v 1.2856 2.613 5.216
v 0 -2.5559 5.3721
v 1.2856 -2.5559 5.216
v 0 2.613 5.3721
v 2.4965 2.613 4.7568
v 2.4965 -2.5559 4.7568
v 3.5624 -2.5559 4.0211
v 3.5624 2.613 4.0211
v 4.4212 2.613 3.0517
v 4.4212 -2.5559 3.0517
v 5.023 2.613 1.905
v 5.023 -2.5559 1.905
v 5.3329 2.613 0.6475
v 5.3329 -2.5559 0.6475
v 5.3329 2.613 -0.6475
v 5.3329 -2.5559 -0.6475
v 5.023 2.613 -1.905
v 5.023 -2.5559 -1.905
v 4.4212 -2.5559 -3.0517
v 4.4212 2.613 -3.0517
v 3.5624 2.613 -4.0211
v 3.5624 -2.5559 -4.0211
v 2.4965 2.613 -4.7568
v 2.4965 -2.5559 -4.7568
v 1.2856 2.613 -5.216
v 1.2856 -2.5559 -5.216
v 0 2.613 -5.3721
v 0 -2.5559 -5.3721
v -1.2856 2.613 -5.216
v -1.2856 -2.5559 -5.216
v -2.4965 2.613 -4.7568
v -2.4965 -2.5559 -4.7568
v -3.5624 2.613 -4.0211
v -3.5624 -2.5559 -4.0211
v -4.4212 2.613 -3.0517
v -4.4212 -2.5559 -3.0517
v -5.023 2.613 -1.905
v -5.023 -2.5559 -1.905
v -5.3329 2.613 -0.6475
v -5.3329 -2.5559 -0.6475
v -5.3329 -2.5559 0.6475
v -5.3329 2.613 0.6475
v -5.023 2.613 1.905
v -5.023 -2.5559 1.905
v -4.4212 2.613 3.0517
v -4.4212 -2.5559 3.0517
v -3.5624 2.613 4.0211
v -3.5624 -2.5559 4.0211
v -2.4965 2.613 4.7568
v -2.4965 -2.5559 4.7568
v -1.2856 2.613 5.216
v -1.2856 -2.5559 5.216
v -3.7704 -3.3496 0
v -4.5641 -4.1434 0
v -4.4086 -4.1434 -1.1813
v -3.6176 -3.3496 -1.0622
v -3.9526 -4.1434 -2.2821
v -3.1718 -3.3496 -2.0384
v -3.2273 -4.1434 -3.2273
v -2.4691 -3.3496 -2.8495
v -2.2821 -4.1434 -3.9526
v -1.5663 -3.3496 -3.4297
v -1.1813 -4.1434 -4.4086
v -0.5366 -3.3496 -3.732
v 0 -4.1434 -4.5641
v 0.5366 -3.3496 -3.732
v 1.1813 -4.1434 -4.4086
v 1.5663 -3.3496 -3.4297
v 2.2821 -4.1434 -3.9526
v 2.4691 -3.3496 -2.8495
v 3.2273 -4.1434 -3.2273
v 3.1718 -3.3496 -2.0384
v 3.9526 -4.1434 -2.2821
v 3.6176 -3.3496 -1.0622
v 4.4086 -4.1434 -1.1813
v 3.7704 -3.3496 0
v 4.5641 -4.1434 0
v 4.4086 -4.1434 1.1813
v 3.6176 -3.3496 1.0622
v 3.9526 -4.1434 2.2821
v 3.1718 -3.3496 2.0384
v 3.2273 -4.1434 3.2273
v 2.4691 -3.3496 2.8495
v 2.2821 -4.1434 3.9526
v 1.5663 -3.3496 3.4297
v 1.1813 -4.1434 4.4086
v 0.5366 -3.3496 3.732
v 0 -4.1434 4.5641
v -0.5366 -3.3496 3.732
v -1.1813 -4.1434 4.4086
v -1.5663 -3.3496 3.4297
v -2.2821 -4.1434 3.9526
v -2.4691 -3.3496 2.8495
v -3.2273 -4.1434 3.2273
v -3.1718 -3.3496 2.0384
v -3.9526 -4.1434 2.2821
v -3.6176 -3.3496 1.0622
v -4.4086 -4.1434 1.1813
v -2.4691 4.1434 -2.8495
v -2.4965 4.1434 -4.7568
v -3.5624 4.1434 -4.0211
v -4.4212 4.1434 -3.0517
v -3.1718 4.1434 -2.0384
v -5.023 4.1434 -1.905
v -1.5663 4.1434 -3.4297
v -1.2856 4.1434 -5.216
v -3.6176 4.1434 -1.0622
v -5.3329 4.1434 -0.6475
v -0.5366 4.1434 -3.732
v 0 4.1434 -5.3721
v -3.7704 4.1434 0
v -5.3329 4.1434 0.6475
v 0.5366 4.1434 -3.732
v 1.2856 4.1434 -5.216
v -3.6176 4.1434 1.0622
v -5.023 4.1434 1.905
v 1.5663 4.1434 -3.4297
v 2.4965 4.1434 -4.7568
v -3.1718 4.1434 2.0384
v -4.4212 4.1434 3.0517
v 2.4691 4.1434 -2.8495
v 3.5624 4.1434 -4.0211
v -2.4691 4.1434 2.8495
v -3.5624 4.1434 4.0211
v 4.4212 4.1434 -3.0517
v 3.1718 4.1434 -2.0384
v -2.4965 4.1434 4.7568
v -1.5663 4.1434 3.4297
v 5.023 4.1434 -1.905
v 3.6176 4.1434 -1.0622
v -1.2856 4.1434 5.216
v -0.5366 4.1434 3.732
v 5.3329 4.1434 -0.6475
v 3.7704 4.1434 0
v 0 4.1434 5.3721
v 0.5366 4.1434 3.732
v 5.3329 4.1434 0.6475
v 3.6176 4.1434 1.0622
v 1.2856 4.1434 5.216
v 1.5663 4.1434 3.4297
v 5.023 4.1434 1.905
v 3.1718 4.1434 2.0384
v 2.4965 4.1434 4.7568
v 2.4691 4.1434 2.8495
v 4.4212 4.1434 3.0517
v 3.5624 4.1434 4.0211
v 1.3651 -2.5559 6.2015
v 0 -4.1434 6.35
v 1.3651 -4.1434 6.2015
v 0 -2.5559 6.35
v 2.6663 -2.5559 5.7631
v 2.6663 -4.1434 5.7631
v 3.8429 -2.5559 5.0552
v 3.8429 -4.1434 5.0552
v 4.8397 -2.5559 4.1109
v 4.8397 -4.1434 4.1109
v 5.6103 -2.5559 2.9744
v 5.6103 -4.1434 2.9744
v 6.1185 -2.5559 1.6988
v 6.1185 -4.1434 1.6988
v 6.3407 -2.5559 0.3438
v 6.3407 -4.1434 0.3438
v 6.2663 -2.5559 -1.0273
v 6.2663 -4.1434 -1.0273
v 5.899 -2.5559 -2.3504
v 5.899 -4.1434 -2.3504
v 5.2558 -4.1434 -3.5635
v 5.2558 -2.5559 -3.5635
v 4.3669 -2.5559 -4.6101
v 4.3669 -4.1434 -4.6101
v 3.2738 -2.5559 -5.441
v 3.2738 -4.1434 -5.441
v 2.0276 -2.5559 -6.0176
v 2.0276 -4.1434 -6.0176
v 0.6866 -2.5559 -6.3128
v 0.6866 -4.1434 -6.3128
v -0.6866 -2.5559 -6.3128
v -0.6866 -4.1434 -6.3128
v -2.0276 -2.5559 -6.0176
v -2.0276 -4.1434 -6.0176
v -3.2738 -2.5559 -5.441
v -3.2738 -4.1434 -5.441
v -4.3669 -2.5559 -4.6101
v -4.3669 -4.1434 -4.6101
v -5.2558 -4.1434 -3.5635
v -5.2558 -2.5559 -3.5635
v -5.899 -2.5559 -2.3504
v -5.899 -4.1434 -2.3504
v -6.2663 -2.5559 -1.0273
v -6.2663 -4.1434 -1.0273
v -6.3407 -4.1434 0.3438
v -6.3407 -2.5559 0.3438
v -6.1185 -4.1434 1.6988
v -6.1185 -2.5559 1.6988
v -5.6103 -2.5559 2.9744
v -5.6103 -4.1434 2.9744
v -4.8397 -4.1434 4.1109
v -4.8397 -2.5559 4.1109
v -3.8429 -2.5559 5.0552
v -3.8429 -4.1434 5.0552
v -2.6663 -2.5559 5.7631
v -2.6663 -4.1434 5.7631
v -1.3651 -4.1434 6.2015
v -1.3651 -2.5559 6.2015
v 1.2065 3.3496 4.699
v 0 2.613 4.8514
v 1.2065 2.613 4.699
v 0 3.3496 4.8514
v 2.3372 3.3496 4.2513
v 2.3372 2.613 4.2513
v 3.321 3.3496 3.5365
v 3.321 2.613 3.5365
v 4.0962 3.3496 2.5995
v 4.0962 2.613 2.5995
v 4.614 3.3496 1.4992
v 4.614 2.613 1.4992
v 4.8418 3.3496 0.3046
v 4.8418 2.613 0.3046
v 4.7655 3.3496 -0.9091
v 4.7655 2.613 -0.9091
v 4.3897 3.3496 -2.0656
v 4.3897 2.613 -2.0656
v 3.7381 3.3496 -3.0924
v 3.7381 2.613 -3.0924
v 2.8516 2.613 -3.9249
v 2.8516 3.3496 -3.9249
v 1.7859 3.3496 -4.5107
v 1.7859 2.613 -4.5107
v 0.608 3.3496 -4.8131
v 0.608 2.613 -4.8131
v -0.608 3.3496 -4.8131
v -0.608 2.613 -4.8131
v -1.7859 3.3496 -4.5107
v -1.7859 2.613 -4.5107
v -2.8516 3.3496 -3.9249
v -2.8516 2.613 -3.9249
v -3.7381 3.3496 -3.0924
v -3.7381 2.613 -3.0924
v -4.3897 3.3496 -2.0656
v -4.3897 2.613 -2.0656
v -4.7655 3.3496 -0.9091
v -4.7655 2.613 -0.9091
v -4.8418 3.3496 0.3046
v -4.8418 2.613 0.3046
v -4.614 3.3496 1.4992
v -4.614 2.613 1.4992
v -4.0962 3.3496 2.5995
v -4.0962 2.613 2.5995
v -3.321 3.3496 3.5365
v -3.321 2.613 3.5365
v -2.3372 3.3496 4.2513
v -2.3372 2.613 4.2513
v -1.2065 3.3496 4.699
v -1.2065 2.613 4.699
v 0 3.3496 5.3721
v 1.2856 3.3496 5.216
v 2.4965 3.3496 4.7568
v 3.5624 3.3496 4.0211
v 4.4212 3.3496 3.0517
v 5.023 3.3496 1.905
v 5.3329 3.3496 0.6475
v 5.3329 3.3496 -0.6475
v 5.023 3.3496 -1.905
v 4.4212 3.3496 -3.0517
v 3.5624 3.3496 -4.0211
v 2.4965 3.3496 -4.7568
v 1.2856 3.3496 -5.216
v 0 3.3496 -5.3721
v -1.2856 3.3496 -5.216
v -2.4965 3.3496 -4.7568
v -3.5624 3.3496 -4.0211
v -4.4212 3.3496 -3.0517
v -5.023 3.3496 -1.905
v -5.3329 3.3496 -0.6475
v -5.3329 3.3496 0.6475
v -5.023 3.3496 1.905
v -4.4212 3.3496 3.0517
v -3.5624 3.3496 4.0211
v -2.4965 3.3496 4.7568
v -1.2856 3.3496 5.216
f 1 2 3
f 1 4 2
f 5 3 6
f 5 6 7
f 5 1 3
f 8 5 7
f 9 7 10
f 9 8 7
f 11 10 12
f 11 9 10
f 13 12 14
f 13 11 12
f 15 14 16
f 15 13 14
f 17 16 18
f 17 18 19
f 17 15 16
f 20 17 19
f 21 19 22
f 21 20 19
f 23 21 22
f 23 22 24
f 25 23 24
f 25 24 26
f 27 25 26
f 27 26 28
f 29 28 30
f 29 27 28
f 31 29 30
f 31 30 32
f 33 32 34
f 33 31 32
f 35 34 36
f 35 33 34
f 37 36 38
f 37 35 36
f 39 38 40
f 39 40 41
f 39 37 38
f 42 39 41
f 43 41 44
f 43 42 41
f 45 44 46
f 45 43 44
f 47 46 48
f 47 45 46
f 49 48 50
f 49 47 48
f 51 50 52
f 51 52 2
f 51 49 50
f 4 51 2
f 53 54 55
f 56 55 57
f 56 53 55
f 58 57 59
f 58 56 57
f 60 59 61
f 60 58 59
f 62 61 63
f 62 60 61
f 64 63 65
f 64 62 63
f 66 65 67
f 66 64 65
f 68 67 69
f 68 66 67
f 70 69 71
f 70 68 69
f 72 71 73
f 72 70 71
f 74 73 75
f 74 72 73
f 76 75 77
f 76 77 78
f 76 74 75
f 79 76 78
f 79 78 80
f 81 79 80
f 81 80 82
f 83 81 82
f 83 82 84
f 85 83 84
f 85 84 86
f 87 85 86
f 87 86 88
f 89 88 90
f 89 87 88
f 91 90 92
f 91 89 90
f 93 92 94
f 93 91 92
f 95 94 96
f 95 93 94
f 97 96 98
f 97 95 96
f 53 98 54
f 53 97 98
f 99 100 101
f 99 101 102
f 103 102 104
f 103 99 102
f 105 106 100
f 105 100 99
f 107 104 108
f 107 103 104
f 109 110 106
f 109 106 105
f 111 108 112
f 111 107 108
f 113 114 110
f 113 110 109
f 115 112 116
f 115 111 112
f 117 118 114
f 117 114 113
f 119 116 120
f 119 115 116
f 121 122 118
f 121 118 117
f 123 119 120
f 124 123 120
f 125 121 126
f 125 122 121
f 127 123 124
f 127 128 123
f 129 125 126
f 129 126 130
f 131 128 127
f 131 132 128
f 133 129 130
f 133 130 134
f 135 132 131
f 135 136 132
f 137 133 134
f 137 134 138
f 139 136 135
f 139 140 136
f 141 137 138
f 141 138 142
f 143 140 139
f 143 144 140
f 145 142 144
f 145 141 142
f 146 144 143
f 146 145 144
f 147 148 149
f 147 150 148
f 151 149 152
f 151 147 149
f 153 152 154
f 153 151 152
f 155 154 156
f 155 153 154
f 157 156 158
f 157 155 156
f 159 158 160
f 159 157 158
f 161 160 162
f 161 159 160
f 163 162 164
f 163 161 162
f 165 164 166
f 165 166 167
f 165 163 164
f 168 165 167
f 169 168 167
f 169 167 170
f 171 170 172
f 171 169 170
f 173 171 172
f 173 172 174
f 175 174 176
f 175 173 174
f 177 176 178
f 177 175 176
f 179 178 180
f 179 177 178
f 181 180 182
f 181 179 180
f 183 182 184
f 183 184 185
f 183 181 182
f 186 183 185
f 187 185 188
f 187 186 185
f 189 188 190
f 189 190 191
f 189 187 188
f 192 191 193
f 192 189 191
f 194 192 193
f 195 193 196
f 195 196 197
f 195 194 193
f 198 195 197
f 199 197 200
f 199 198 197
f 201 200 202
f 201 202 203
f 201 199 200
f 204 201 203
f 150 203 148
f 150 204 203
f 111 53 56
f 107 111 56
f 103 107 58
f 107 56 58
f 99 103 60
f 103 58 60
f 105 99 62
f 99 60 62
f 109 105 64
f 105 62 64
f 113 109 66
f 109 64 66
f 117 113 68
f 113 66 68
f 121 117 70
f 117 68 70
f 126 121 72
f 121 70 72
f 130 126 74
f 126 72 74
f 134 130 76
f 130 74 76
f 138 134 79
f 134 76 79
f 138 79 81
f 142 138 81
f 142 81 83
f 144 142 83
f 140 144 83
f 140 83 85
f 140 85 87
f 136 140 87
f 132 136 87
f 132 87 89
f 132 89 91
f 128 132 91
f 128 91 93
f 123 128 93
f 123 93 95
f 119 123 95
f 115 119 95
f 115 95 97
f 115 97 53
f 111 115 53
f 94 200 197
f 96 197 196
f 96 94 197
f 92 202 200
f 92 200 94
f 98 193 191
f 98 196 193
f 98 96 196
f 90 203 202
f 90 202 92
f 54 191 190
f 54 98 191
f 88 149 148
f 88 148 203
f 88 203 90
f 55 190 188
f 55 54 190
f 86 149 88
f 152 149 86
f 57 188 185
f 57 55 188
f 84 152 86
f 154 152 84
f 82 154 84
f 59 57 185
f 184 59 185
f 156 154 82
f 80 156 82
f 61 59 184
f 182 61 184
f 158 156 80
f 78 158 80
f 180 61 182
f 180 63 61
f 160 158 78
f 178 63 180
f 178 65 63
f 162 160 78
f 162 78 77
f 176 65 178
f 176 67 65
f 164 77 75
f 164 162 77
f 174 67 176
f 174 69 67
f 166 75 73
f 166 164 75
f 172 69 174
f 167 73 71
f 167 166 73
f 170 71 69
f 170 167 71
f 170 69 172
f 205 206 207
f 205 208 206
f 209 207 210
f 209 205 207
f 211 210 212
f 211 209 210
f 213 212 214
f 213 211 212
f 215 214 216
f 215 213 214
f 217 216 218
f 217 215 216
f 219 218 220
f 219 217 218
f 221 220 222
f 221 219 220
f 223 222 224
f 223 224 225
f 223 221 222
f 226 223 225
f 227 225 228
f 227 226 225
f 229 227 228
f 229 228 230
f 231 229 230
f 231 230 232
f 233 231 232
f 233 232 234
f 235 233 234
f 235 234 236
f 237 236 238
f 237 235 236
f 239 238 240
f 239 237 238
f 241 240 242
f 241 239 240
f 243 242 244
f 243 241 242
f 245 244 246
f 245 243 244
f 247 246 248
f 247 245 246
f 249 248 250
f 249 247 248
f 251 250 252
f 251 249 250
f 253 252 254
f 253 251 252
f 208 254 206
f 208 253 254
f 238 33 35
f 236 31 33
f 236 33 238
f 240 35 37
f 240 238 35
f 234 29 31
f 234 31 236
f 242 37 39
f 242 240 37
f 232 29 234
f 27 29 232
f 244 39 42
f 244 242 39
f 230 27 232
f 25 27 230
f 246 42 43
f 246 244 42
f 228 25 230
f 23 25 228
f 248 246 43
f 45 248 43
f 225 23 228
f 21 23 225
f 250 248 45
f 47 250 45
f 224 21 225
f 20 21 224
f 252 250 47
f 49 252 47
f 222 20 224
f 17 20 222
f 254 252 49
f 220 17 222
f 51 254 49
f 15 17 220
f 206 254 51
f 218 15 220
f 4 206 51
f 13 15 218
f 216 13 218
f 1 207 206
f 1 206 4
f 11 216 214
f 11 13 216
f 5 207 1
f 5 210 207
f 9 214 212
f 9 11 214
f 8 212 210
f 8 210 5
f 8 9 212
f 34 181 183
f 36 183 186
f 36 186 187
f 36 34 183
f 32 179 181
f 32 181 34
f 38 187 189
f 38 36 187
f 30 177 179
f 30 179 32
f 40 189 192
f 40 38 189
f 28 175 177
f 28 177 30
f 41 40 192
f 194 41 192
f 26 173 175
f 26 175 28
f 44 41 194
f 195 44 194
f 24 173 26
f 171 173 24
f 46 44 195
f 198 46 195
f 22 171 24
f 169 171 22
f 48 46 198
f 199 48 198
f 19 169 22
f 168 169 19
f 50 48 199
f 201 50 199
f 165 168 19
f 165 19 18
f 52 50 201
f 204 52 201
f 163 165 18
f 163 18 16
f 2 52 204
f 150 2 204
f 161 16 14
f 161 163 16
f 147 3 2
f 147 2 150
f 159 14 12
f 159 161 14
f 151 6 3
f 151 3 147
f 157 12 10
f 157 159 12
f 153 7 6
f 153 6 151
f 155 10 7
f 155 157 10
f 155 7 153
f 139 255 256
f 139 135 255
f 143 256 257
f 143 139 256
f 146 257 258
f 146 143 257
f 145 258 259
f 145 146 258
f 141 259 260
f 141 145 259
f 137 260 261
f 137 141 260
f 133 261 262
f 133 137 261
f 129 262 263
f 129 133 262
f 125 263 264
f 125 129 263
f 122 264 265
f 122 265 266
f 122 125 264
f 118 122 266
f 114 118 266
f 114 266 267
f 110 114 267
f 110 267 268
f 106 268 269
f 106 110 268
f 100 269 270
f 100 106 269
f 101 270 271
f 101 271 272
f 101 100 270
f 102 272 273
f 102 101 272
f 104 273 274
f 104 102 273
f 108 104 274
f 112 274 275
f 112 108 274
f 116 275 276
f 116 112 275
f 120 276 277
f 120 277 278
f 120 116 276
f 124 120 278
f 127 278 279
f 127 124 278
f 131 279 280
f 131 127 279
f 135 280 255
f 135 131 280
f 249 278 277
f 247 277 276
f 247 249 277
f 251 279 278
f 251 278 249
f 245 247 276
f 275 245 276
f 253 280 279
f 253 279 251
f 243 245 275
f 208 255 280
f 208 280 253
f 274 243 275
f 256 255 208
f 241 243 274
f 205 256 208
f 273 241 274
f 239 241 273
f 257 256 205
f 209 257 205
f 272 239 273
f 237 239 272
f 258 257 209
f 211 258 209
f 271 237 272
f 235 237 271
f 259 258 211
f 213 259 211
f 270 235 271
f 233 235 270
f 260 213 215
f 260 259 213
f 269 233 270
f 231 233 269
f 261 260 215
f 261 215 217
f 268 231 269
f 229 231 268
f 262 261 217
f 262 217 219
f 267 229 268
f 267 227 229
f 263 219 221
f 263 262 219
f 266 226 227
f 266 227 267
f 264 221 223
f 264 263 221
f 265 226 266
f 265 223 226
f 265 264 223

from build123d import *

# Parameters (mm, degrees)
F_19_64_0_29688_DIAMETER_HOLE1_D     = 7.540752
F_19_64_0_29688_DIAMETER_HOLE1_DEPTH = 8.382
F_19_64_0_29688_DIAMETER_HOLE1_TIP   = 2.265470457
CHAMFER1_SIZE                        = 0.79375


with BuildPart() as part:
    # Sketch1 → Revolve1 (revolve)
    with BuildSketch(Plane(origin=(0, 0, 0), x_dir=(0, 0, -1), z_dir=(1, 0, 0))):
        Polygon((0, -4.143375), (-6.35, -4.143375), (-6.35, -2.555875), (-5.3721, -2.555875), (-5.3721, 2.613025), (-4.8514, 2.613025), (-4.8514, 3.349625), (-5.3721, 3.349625), (-5.3721, 4.143375), (0, 4.143375), align=None)
    revolve(axis=Axis((0, 0, 0), (0, 1, 0)))

    # 19/64 (0.29688) Diameter Hole1
    with Locations(Plane(origin=(0, 4.143375, 0), x_dir=(1, 0, 0), z_dir=(0, 1, 0))):
        with Locations((0, 0)):
            Hole(F_19_64_0_29688_DIAMETER_HOLE1_D / 2, depth=F_19_64_0_29688_DIAMETER_HOLE1_DEPTH)
            with Locations((0, 0, -(F_19_64_0_29688_DIAMETER_HOLE1_DEPTH + F_19_64_0_29688_DIAMETER_HOLE1_TIP / 2))):  # 118° drill point
                Cone(0, F_19_64_0_29688_DIAMETER_HOLE1_D / 2, F_19_64_0_29688_DIAMETER_HOLE1_TIP, mode=Mode.SUBTRACT)

    # Chamfer1
    chamfer1_edges = [part.edges().sort_by_distance(p)[0] for p in [
        (3.770376, -4.143375, 0),
    ]]
    chamfer(chamfer1_edges, length=CHAMFER1_SIZE)


solid = part.part
